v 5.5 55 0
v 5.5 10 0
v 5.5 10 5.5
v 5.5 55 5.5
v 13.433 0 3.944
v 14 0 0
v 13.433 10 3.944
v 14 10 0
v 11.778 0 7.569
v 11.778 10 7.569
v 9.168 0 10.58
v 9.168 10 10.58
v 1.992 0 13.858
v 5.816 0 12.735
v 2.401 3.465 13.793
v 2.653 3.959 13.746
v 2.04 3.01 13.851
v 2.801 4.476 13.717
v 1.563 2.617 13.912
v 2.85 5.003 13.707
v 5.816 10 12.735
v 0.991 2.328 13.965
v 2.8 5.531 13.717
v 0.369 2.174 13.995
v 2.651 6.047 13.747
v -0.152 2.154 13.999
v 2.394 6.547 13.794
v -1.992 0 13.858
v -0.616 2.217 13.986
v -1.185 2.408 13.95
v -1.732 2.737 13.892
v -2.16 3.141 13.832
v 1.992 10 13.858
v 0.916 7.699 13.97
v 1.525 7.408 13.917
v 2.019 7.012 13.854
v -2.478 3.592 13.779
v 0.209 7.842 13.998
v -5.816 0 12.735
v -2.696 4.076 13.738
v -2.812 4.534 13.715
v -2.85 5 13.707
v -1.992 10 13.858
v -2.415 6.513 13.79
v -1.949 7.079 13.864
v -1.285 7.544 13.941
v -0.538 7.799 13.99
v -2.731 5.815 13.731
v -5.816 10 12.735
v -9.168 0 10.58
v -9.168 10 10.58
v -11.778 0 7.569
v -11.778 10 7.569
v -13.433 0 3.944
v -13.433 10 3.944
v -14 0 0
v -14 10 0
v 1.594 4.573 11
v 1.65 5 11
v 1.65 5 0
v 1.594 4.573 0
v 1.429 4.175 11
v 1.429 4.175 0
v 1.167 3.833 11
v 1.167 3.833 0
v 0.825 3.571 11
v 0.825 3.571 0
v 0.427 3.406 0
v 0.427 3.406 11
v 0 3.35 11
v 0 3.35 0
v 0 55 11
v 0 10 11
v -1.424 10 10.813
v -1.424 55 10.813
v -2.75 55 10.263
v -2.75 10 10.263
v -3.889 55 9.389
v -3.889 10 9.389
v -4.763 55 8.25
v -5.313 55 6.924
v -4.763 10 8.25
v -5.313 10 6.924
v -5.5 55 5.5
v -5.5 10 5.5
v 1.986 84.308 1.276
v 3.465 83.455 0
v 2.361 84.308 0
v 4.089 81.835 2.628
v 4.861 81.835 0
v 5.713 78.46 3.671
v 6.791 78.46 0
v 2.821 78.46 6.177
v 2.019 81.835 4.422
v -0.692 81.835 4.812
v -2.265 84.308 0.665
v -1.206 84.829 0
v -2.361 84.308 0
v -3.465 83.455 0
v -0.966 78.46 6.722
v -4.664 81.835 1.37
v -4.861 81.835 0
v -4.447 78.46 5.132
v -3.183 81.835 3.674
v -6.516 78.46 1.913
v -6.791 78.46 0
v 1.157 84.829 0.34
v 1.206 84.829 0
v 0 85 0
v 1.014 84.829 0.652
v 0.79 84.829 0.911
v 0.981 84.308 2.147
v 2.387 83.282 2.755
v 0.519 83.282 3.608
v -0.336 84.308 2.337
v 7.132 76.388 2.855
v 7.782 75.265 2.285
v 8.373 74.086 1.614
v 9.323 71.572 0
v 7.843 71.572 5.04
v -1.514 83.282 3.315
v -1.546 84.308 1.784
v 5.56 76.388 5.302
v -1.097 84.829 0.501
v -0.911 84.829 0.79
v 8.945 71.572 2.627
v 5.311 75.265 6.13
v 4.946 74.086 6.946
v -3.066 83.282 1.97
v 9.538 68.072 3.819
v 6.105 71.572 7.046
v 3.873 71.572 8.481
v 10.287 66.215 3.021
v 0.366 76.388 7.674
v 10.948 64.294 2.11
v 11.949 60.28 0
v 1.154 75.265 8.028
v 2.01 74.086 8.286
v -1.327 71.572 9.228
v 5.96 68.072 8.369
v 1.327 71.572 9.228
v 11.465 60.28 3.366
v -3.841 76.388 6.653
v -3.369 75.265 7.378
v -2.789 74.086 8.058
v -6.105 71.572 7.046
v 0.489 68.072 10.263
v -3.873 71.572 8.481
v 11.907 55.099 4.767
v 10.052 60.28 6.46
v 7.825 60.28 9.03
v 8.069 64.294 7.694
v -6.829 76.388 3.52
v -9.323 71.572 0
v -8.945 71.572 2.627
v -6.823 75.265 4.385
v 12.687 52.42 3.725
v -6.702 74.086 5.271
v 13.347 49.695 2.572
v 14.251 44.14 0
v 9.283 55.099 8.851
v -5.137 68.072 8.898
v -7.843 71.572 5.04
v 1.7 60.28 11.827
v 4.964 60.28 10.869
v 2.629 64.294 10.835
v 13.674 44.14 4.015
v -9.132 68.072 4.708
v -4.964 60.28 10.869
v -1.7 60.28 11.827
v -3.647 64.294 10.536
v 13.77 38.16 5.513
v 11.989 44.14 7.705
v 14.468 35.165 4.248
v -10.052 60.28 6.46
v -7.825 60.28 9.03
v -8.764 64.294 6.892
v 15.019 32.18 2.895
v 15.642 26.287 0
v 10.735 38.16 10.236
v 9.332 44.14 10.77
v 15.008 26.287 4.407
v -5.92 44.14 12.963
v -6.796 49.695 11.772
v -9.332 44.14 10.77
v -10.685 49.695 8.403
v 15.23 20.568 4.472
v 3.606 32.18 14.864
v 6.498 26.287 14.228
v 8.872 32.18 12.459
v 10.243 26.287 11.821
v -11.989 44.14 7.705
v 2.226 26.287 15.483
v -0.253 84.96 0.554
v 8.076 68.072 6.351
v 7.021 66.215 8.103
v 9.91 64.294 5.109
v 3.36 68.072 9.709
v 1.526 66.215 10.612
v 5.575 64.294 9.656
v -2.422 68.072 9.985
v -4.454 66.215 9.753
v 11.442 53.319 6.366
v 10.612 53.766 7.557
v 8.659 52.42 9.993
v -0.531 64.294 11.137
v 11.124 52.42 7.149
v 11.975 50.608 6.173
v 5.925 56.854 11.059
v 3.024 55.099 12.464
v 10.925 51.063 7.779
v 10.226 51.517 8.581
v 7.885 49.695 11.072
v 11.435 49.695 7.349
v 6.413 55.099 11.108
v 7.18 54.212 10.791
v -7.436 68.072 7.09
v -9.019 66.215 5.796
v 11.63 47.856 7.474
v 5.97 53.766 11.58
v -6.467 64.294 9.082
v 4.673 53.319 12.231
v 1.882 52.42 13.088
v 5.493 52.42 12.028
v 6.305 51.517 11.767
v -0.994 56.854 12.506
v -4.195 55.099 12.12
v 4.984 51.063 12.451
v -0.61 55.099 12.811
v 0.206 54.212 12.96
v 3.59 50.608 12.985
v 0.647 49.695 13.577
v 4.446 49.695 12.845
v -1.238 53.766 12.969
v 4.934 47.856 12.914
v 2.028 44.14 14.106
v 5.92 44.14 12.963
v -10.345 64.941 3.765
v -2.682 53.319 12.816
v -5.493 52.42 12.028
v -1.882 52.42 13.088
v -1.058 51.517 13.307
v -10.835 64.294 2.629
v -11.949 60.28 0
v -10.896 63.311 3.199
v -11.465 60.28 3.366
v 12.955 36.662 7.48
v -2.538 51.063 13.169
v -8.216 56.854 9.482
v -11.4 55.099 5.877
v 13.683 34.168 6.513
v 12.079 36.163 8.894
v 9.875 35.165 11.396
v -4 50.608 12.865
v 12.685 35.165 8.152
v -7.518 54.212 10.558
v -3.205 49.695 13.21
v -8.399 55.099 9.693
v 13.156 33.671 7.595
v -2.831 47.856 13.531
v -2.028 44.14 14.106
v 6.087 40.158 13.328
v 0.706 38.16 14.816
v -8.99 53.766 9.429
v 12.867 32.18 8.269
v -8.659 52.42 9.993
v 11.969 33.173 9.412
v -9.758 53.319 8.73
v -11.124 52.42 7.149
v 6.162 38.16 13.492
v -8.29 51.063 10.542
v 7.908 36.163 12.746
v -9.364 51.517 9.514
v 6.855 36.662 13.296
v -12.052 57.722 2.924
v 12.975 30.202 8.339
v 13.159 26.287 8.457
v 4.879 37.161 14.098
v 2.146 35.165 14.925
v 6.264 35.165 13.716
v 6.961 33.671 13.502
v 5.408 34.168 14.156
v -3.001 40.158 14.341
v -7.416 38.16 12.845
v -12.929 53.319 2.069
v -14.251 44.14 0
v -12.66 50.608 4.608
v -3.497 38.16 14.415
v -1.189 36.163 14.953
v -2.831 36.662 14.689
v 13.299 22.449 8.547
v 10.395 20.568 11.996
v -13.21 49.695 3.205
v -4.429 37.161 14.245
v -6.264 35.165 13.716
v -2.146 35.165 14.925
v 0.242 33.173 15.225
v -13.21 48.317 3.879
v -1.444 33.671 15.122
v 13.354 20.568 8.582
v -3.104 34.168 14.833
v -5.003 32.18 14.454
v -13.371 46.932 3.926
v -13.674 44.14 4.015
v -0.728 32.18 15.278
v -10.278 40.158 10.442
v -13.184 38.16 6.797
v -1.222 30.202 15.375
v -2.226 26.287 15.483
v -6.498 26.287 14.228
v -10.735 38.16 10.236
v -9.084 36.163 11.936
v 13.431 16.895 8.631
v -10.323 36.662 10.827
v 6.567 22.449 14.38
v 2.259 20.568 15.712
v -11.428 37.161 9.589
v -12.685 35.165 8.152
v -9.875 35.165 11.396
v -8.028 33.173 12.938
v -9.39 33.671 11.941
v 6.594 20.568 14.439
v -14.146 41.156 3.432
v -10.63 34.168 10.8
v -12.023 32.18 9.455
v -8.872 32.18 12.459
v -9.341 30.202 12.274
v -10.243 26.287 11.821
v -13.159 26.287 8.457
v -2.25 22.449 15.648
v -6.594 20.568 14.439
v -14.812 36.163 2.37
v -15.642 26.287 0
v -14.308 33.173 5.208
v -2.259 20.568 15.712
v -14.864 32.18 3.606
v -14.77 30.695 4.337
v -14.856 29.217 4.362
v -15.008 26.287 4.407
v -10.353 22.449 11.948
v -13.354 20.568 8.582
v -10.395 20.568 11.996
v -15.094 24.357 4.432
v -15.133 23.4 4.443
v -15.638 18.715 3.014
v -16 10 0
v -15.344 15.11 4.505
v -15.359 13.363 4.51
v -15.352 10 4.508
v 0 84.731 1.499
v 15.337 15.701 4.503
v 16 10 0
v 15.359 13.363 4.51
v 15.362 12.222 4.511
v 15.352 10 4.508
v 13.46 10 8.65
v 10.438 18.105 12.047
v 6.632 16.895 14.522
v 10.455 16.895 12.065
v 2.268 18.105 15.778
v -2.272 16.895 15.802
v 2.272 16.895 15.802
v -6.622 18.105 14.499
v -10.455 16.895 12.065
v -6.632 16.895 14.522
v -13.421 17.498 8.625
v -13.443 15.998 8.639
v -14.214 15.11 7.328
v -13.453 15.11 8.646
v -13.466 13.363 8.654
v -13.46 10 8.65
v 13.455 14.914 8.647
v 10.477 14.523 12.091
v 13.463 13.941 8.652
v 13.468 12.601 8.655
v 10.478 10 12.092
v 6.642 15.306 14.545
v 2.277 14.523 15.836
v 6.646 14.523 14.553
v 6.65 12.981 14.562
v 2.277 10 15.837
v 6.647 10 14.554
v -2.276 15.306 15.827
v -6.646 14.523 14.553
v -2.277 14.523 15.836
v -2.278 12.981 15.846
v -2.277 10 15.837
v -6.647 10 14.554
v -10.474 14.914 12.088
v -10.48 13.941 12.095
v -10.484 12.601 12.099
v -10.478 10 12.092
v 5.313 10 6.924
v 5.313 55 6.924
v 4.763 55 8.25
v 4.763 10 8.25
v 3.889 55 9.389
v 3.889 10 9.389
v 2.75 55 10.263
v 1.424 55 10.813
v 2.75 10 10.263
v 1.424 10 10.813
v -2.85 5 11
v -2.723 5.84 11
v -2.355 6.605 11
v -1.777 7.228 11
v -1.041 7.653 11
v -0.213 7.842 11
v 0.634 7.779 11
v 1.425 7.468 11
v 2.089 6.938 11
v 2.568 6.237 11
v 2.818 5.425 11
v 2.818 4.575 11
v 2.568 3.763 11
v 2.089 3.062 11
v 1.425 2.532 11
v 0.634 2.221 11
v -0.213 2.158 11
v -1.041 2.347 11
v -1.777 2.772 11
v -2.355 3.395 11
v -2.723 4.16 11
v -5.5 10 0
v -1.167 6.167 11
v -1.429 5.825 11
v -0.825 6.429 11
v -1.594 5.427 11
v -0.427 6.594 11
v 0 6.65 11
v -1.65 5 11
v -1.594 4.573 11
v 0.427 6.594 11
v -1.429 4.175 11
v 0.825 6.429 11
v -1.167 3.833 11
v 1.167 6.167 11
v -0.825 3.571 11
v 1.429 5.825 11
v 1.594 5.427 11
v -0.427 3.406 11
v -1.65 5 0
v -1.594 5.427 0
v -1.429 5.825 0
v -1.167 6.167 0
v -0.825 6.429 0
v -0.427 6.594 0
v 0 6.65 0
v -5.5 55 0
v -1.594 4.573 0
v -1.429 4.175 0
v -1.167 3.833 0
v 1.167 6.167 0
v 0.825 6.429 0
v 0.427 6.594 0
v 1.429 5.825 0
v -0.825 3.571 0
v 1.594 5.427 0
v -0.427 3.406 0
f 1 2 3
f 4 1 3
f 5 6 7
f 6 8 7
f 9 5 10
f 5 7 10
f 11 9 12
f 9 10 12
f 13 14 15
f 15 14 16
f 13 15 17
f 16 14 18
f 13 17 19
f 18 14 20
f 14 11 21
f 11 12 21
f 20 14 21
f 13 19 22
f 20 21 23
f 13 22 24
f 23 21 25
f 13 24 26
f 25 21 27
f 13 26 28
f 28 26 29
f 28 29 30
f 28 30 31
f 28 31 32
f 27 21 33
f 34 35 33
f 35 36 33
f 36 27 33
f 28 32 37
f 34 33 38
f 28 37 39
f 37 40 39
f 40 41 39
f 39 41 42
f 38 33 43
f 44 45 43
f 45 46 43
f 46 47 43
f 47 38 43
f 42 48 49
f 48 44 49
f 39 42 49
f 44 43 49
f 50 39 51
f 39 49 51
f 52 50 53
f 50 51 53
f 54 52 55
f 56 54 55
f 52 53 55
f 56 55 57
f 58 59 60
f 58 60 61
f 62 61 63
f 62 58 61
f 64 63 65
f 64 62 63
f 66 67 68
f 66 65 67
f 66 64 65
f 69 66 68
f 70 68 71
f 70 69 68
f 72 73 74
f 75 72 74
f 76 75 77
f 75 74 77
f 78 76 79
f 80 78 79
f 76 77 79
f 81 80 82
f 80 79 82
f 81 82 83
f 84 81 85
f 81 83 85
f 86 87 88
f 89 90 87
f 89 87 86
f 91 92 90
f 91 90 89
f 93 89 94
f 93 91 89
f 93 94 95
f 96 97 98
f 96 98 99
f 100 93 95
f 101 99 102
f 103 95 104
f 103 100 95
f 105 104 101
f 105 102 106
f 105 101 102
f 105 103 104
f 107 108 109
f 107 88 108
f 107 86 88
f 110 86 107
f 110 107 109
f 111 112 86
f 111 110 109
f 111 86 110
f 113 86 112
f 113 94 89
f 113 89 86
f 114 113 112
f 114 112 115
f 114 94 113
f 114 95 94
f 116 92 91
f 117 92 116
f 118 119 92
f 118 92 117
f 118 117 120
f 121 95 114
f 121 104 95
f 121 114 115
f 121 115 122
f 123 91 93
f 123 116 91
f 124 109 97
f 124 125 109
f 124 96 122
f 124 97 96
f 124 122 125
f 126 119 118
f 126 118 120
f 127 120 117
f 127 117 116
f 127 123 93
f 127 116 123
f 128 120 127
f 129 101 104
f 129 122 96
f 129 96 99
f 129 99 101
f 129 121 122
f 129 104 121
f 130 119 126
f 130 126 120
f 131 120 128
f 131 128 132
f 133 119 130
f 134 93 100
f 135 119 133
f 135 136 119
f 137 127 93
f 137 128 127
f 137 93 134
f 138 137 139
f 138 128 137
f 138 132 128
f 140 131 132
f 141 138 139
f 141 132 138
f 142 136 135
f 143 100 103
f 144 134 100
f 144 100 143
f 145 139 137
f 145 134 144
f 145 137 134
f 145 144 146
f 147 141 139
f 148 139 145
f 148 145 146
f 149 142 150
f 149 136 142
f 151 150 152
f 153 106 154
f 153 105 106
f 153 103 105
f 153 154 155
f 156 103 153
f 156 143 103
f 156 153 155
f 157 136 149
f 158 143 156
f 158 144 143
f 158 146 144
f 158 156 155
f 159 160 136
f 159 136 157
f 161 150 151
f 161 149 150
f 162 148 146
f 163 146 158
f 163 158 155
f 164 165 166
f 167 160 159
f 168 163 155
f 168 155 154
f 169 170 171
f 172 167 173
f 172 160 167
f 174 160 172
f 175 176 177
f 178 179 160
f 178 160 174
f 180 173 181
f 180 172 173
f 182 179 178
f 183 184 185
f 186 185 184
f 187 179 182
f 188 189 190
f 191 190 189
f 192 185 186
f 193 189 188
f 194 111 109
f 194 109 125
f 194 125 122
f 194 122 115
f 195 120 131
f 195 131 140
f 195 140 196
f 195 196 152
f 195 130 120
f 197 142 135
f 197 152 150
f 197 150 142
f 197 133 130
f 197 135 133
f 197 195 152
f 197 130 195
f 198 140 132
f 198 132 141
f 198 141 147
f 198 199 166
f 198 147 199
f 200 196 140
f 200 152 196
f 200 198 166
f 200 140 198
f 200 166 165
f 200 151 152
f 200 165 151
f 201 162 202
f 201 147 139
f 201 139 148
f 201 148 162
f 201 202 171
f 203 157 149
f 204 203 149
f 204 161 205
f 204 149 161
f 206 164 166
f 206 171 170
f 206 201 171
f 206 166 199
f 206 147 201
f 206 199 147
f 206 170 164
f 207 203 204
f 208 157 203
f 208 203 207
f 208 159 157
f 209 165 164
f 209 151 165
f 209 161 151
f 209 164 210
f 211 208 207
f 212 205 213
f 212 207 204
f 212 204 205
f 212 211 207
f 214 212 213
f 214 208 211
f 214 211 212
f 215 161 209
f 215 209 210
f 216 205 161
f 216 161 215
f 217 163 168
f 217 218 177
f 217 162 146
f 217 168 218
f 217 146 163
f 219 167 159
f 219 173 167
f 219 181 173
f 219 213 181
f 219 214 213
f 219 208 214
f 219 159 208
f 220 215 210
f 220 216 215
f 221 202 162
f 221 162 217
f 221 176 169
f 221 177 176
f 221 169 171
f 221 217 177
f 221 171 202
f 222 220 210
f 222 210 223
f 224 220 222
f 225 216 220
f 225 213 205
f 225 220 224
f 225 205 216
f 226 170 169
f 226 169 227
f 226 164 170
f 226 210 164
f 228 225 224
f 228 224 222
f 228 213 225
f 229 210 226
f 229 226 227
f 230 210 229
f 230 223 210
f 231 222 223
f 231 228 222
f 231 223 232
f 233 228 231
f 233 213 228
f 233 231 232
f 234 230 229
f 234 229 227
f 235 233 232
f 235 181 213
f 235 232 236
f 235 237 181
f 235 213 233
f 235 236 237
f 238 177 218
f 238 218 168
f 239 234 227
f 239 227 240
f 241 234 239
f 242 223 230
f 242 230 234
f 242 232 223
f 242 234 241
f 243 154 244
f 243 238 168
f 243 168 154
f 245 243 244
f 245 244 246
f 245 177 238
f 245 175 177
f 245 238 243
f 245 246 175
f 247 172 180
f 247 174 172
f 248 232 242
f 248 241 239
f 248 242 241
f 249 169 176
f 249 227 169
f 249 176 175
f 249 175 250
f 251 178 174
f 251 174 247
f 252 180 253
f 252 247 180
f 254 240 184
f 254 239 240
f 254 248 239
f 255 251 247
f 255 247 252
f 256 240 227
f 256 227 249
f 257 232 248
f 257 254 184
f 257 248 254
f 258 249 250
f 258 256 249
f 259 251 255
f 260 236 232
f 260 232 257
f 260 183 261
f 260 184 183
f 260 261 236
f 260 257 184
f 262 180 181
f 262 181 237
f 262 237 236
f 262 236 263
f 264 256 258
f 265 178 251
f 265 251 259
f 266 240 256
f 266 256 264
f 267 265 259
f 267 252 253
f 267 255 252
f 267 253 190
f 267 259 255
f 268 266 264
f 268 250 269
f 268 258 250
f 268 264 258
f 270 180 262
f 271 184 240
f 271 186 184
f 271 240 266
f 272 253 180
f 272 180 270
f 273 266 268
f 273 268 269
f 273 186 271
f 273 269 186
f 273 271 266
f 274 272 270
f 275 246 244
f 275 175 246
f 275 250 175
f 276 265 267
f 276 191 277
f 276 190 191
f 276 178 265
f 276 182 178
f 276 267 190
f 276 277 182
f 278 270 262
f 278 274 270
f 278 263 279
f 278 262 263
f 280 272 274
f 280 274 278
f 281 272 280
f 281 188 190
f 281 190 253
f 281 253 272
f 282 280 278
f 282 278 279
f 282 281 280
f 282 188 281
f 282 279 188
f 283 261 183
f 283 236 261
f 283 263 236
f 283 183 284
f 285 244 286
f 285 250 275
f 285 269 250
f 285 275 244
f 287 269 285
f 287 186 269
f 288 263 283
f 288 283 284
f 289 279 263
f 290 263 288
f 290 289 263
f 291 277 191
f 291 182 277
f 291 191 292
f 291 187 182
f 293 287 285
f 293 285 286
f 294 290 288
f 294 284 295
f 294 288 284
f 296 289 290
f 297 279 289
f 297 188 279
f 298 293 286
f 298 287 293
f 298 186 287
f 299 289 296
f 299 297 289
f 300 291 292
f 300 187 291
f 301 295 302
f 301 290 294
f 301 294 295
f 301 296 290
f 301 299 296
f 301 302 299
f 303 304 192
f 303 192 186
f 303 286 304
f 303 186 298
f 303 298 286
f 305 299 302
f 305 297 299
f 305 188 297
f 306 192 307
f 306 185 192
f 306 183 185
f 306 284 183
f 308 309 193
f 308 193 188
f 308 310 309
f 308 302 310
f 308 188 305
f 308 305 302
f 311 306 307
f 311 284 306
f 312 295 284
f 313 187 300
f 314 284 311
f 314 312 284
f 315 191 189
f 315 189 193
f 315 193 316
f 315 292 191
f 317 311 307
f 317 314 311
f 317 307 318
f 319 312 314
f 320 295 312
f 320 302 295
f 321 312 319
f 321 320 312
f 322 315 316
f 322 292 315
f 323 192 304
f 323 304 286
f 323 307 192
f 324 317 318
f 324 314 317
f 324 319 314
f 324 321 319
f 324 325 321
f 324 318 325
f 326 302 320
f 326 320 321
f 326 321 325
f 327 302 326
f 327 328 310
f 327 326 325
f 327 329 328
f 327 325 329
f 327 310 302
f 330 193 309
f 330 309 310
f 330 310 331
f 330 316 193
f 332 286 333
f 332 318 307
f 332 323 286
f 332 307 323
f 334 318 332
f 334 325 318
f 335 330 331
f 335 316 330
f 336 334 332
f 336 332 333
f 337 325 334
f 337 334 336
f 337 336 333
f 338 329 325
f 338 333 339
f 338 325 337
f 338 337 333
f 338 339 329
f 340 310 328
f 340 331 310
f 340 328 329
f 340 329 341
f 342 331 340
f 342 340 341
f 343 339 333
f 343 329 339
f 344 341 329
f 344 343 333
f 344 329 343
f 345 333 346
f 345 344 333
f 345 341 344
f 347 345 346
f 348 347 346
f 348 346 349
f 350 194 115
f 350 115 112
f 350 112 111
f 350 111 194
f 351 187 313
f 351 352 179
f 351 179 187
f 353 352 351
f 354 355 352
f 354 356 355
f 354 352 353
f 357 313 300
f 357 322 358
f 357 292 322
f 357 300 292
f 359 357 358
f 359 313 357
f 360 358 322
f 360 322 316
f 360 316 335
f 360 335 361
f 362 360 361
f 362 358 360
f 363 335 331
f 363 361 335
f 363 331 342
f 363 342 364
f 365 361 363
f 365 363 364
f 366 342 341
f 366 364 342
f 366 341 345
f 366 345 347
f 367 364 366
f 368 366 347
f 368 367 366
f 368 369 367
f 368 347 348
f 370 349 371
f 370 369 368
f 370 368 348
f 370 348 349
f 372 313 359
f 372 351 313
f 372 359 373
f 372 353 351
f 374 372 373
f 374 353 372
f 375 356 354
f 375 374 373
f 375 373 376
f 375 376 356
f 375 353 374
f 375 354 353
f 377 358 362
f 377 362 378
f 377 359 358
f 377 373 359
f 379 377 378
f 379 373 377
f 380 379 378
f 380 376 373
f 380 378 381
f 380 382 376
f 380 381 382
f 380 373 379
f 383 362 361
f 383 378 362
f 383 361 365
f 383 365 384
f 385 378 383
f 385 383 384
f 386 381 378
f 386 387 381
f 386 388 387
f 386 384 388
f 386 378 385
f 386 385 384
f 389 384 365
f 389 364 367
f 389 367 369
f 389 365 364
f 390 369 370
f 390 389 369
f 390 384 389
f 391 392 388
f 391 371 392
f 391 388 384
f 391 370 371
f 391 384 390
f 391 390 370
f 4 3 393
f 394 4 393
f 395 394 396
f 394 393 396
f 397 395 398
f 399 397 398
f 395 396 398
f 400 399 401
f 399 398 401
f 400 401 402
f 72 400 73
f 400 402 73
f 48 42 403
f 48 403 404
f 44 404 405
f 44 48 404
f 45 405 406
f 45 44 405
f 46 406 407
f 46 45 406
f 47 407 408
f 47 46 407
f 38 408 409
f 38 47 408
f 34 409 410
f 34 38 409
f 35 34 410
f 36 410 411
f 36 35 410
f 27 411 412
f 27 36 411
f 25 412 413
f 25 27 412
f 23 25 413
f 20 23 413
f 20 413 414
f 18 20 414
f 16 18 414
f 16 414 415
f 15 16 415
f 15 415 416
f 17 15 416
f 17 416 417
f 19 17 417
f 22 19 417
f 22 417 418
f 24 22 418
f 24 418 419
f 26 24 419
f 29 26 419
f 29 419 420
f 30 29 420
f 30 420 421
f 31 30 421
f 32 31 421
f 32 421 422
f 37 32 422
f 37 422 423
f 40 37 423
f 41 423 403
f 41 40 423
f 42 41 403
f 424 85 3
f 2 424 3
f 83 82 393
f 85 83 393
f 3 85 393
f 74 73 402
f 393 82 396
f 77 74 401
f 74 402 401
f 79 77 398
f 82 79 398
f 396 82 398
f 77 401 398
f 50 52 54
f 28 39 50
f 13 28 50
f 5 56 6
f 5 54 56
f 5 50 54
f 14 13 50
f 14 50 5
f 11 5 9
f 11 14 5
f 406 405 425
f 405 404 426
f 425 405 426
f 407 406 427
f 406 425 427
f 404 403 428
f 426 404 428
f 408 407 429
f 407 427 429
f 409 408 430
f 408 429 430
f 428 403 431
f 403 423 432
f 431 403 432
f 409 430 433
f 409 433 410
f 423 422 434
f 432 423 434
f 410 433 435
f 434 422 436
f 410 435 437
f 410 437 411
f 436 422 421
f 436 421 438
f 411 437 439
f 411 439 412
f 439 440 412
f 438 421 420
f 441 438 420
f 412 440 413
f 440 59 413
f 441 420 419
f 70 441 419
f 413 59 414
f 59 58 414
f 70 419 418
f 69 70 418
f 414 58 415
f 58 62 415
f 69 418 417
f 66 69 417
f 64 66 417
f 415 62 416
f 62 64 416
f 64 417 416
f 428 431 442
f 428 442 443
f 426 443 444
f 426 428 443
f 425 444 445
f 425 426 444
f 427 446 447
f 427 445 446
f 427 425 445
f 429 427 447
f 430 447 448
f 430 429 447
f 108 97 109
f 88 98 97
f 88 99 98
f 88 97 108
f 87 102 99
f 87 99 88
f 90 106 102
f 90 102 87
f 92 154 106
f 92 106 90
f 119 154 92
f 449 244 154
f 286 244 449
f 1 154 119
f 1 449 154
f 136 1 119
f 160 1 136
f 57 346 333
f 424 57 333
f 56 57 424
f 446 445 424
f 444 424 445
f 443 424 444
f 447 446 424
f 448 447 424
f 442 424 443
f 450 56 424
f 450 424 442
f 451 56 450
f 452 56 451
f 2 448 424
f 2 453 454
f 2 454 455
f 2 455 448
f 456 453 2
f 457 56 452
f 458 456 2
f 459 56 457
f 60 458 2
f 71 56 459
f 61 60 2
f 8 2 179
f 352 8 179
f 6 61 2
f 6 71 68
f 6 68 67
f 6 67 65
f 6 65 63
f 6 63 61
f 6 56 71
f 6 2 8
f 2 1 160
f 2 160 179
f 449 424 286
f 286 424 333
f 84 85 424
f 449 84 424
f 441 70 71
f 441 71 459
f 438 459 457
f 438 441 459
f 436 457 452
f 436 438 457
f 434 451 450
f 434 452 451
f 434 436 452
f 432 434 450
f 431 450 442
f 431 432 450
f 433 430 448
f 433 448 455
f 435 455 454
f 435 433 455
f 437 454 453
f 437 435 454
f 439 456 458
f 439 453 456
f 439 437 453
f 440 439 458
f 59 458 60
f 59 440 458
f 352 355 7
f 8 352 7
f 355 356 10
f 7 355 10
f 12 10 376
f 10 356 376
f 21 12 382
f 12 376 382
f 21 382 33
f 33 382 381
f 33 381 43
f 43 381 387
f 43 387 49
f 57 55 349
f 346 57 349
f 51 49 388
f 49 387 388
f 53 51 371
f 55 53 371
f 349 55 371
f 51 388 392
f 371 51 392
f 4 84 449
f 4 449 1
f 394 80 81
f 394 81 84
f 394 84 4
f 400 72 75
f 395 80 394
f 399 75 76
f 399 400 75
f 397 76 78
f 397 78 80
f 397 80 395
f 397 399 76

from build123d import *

# Parameters (mm, degrees)
F0_W     = 8.5
F0_H     = 10
F2_ANGLE = 180
F3_DEPTH = 55
F4_DEPTH = 10
F7_DEPTH = 25
F8_DEPTH = 3


with BuildPart() as f2:
    # F0 (on Top) → F2 (revolve)
    with BuildSketch(Plane.XY):
        with BuildLine():
            Line((0, 85), (0, 45))
            Line((0, 45), (5.5, 45))
            Line((5.5, 45), (5.5, 10))
            Line((5.5, 10), (14, 10))
            Line((14, 10), (16, 10))
            add(Edge.make_bspline(
                [(0, 85), (11.4376060665, 85.1000958681), (16.2615635544, 37.3789982498), (16, 10)],
                knots=[0, 0, 0, 0, 76.6876782802, 76.6876782802, 76.6876782802, 76.6876782802], degree=3))
        make_face()
        with Locations((9.75, 5)):
            Rectangle(F0_W, F0_H)
    revolve(axis=Axis((0, 47.5, 0), (0, -1, 0)), revolution_arc=F2_ANGLE)

    # F1 (on Front) → F3 (cut)
    with BuildSketch(Plane.XZ):
        with BuildLine():
            Line((0, 5.5), (0, 0))
            ThreePointArc((0, 0), (3.8890872965, 1.6109127035), (5.5, 5.5))
            Line((5.5, 5.5), (0, 5.5))
        make_face()
        with BuildLine():
            ThreePointArc((5.5, 5.5), (3.8890872965, 1.6109127035), (0, 0))
            Line((0, 0), (5.5, 0))
            Line((5.5, 0), (5.5, 5.5))
        make_face()
        with BuildLine():
            Line((-5.5, 0), (0, 0))
            ThreePointArc((0, 0), (-3.8890872965, 1.6109127035), (-5.5, 5.5))
            Line((-5.5, 5.5), (-5.5, 0))
        make_face()
        with BuildLine():
            ThreePointArc((-5.5, 5.5), (-3.8890872965, 1.6109127035), (0, 0))
            Line((0, 0), (0, 5.5))
            Line((0, 5.5), (-5.5, 5.5))
        make_face()
        with BuildLine():
            Line((-5.5, 5.5), (0, 5.5))
            Line((0, 5.5), (0, 11))
            ThreePointArc((0, 11), (-3.8890872965, 9.3890872965), (-5.5, 5.5))
        make_face()
        with BuildLine():
            Line((0, 11), (0, 5.5))
            Line((0, 5.5), (5.5, 5.5))
            ThreePointArc((5.5, 5.5), (3.8890872965, 9.3890872965), (0, 11))
        make_face()
    extrude(amount=-F3_DEPTH, mode=Mode.SUBTRACT)

    # F1 (on Front) → F4 (join)
    with BuildSketch(Plane.XZ):
        with BuildLine():
            ThreePointArc((5.5, 5.5), (3.8890872965, 1.6109127035), (0, 0))
            Line((0, 0), (5.5, 0))
            Line((5.5, 0), (5.5, 5.5))
        make_face()
        with BuildLine():
            Line((0, 5.5), (0, 0))
            ThreePointArc((0, 0), (3.8890872965, 1.6109127035), (5.5, 5.5))
            Line((5.5, 5.5), (0, 5.5))
        make_face()
        with BuildLine():
            Line((0, 11), (0, 5.5))
            Line((0, 5.5), (5.5, 5.5))
            ThreePointArc((5.5, 5.5), (3.8890872965, 9.3890872965), (0, 11))
        make_face()
        with BuildLine():
            Line((-5.5, 5.5), (0, 5.5))
            Line((0, 5.5), (0, 11))
            ThreePointArc((0, 11), (-3.8890872965, 9.3890872965), (-5.5, 5.5))
        make_face()
        with BuildLine():
            ThreePointArc((-5.5, 5.5), (-3.8890872965, 1.6109127035), (0, 0))
            Line((0, 0), (0, 5.5))
            Line((0, 5.5), (-5.5, 5.5))
        make_face()
        with BuildLine():
            Line((-5.5, 0), (0, 0))
            ThreePointArc((0, 0), (-3.8890872965, 1.6109127035), (-5.5, 5.5))
            Line((-5.5, 5.5), (-5.5, 0))
        make_face()
    extrude(amount=-F4_DEPTH)

    # F6 (on offset) → F7 (cut)
    with BuildSketch(Plane(origin=(0, 0, 14), x_dir=(1, 0, 0), z_dir=(0, 0, -1))):
        with BuildLine():
            Line((0, -3.35), (0, -5))
            Line((0, -5), (0, -6.65))
            ThreePointArc((0, -6.65), (1.166726189, -6.166726189), (1.65, -5))
            ThreePointArc((1.65, -5), (1.166726189, -3.833273811), (0, -3.35))
        make_face()
        with BuildLine():
            ThreePointArc((0, -3.35), (-1.166726189, -3.833273811), (-1.65, -5))
            Line((-1.65, -5), (0, -5))
            Line((0, -5), (0, -3.35))
        make_face()
        with BuildLine():
            Line((0, -5), (-1.65, -5))
            ThreePointArc((-1.65, -5), (-1.166726189, -6.166726189), (0, -6.65))
            Line((0, -6.65), (0, -5))
        make_face()
    extrude(amount=F7_DEPTH, mode=Mode.SUBTRACT)

    # F6 (on offset) → F8 (cut)
    with BuildSketch(Plane(origin=(0, 0, 14), x_dir=(1, 0, 0), z_dir=(0, 0, -1))):
        with BuildLine():
            ThreePointArc((2.85, -5), (0, -2.15), (-2.85, -5))
            ThreePointArc((-2.85, -5), (0, -7.85), (2.85, -5))
        make_face()
        with BuildLine():
            ThreePointArc((0, -6.65), (-1.166726189, -6.166726189), (-1.65, -5))
            ThreePointArc((-1.65, -5), (-1.166726189, -3.833273811), (0, -3.35))
            ThreePointArc((0, -3.35), (1.166726189, -3.833273811), (1.65, -5))
            ThreePointArc((1.65, -5), (1.166726189, -6.166726189), (0, -6.65))
        make_face(mode=Mode.SUBTRACT)
    extrude(amount=F8_DEPTH, mode=Mode.SUBTRACT)


solid = f2.part
